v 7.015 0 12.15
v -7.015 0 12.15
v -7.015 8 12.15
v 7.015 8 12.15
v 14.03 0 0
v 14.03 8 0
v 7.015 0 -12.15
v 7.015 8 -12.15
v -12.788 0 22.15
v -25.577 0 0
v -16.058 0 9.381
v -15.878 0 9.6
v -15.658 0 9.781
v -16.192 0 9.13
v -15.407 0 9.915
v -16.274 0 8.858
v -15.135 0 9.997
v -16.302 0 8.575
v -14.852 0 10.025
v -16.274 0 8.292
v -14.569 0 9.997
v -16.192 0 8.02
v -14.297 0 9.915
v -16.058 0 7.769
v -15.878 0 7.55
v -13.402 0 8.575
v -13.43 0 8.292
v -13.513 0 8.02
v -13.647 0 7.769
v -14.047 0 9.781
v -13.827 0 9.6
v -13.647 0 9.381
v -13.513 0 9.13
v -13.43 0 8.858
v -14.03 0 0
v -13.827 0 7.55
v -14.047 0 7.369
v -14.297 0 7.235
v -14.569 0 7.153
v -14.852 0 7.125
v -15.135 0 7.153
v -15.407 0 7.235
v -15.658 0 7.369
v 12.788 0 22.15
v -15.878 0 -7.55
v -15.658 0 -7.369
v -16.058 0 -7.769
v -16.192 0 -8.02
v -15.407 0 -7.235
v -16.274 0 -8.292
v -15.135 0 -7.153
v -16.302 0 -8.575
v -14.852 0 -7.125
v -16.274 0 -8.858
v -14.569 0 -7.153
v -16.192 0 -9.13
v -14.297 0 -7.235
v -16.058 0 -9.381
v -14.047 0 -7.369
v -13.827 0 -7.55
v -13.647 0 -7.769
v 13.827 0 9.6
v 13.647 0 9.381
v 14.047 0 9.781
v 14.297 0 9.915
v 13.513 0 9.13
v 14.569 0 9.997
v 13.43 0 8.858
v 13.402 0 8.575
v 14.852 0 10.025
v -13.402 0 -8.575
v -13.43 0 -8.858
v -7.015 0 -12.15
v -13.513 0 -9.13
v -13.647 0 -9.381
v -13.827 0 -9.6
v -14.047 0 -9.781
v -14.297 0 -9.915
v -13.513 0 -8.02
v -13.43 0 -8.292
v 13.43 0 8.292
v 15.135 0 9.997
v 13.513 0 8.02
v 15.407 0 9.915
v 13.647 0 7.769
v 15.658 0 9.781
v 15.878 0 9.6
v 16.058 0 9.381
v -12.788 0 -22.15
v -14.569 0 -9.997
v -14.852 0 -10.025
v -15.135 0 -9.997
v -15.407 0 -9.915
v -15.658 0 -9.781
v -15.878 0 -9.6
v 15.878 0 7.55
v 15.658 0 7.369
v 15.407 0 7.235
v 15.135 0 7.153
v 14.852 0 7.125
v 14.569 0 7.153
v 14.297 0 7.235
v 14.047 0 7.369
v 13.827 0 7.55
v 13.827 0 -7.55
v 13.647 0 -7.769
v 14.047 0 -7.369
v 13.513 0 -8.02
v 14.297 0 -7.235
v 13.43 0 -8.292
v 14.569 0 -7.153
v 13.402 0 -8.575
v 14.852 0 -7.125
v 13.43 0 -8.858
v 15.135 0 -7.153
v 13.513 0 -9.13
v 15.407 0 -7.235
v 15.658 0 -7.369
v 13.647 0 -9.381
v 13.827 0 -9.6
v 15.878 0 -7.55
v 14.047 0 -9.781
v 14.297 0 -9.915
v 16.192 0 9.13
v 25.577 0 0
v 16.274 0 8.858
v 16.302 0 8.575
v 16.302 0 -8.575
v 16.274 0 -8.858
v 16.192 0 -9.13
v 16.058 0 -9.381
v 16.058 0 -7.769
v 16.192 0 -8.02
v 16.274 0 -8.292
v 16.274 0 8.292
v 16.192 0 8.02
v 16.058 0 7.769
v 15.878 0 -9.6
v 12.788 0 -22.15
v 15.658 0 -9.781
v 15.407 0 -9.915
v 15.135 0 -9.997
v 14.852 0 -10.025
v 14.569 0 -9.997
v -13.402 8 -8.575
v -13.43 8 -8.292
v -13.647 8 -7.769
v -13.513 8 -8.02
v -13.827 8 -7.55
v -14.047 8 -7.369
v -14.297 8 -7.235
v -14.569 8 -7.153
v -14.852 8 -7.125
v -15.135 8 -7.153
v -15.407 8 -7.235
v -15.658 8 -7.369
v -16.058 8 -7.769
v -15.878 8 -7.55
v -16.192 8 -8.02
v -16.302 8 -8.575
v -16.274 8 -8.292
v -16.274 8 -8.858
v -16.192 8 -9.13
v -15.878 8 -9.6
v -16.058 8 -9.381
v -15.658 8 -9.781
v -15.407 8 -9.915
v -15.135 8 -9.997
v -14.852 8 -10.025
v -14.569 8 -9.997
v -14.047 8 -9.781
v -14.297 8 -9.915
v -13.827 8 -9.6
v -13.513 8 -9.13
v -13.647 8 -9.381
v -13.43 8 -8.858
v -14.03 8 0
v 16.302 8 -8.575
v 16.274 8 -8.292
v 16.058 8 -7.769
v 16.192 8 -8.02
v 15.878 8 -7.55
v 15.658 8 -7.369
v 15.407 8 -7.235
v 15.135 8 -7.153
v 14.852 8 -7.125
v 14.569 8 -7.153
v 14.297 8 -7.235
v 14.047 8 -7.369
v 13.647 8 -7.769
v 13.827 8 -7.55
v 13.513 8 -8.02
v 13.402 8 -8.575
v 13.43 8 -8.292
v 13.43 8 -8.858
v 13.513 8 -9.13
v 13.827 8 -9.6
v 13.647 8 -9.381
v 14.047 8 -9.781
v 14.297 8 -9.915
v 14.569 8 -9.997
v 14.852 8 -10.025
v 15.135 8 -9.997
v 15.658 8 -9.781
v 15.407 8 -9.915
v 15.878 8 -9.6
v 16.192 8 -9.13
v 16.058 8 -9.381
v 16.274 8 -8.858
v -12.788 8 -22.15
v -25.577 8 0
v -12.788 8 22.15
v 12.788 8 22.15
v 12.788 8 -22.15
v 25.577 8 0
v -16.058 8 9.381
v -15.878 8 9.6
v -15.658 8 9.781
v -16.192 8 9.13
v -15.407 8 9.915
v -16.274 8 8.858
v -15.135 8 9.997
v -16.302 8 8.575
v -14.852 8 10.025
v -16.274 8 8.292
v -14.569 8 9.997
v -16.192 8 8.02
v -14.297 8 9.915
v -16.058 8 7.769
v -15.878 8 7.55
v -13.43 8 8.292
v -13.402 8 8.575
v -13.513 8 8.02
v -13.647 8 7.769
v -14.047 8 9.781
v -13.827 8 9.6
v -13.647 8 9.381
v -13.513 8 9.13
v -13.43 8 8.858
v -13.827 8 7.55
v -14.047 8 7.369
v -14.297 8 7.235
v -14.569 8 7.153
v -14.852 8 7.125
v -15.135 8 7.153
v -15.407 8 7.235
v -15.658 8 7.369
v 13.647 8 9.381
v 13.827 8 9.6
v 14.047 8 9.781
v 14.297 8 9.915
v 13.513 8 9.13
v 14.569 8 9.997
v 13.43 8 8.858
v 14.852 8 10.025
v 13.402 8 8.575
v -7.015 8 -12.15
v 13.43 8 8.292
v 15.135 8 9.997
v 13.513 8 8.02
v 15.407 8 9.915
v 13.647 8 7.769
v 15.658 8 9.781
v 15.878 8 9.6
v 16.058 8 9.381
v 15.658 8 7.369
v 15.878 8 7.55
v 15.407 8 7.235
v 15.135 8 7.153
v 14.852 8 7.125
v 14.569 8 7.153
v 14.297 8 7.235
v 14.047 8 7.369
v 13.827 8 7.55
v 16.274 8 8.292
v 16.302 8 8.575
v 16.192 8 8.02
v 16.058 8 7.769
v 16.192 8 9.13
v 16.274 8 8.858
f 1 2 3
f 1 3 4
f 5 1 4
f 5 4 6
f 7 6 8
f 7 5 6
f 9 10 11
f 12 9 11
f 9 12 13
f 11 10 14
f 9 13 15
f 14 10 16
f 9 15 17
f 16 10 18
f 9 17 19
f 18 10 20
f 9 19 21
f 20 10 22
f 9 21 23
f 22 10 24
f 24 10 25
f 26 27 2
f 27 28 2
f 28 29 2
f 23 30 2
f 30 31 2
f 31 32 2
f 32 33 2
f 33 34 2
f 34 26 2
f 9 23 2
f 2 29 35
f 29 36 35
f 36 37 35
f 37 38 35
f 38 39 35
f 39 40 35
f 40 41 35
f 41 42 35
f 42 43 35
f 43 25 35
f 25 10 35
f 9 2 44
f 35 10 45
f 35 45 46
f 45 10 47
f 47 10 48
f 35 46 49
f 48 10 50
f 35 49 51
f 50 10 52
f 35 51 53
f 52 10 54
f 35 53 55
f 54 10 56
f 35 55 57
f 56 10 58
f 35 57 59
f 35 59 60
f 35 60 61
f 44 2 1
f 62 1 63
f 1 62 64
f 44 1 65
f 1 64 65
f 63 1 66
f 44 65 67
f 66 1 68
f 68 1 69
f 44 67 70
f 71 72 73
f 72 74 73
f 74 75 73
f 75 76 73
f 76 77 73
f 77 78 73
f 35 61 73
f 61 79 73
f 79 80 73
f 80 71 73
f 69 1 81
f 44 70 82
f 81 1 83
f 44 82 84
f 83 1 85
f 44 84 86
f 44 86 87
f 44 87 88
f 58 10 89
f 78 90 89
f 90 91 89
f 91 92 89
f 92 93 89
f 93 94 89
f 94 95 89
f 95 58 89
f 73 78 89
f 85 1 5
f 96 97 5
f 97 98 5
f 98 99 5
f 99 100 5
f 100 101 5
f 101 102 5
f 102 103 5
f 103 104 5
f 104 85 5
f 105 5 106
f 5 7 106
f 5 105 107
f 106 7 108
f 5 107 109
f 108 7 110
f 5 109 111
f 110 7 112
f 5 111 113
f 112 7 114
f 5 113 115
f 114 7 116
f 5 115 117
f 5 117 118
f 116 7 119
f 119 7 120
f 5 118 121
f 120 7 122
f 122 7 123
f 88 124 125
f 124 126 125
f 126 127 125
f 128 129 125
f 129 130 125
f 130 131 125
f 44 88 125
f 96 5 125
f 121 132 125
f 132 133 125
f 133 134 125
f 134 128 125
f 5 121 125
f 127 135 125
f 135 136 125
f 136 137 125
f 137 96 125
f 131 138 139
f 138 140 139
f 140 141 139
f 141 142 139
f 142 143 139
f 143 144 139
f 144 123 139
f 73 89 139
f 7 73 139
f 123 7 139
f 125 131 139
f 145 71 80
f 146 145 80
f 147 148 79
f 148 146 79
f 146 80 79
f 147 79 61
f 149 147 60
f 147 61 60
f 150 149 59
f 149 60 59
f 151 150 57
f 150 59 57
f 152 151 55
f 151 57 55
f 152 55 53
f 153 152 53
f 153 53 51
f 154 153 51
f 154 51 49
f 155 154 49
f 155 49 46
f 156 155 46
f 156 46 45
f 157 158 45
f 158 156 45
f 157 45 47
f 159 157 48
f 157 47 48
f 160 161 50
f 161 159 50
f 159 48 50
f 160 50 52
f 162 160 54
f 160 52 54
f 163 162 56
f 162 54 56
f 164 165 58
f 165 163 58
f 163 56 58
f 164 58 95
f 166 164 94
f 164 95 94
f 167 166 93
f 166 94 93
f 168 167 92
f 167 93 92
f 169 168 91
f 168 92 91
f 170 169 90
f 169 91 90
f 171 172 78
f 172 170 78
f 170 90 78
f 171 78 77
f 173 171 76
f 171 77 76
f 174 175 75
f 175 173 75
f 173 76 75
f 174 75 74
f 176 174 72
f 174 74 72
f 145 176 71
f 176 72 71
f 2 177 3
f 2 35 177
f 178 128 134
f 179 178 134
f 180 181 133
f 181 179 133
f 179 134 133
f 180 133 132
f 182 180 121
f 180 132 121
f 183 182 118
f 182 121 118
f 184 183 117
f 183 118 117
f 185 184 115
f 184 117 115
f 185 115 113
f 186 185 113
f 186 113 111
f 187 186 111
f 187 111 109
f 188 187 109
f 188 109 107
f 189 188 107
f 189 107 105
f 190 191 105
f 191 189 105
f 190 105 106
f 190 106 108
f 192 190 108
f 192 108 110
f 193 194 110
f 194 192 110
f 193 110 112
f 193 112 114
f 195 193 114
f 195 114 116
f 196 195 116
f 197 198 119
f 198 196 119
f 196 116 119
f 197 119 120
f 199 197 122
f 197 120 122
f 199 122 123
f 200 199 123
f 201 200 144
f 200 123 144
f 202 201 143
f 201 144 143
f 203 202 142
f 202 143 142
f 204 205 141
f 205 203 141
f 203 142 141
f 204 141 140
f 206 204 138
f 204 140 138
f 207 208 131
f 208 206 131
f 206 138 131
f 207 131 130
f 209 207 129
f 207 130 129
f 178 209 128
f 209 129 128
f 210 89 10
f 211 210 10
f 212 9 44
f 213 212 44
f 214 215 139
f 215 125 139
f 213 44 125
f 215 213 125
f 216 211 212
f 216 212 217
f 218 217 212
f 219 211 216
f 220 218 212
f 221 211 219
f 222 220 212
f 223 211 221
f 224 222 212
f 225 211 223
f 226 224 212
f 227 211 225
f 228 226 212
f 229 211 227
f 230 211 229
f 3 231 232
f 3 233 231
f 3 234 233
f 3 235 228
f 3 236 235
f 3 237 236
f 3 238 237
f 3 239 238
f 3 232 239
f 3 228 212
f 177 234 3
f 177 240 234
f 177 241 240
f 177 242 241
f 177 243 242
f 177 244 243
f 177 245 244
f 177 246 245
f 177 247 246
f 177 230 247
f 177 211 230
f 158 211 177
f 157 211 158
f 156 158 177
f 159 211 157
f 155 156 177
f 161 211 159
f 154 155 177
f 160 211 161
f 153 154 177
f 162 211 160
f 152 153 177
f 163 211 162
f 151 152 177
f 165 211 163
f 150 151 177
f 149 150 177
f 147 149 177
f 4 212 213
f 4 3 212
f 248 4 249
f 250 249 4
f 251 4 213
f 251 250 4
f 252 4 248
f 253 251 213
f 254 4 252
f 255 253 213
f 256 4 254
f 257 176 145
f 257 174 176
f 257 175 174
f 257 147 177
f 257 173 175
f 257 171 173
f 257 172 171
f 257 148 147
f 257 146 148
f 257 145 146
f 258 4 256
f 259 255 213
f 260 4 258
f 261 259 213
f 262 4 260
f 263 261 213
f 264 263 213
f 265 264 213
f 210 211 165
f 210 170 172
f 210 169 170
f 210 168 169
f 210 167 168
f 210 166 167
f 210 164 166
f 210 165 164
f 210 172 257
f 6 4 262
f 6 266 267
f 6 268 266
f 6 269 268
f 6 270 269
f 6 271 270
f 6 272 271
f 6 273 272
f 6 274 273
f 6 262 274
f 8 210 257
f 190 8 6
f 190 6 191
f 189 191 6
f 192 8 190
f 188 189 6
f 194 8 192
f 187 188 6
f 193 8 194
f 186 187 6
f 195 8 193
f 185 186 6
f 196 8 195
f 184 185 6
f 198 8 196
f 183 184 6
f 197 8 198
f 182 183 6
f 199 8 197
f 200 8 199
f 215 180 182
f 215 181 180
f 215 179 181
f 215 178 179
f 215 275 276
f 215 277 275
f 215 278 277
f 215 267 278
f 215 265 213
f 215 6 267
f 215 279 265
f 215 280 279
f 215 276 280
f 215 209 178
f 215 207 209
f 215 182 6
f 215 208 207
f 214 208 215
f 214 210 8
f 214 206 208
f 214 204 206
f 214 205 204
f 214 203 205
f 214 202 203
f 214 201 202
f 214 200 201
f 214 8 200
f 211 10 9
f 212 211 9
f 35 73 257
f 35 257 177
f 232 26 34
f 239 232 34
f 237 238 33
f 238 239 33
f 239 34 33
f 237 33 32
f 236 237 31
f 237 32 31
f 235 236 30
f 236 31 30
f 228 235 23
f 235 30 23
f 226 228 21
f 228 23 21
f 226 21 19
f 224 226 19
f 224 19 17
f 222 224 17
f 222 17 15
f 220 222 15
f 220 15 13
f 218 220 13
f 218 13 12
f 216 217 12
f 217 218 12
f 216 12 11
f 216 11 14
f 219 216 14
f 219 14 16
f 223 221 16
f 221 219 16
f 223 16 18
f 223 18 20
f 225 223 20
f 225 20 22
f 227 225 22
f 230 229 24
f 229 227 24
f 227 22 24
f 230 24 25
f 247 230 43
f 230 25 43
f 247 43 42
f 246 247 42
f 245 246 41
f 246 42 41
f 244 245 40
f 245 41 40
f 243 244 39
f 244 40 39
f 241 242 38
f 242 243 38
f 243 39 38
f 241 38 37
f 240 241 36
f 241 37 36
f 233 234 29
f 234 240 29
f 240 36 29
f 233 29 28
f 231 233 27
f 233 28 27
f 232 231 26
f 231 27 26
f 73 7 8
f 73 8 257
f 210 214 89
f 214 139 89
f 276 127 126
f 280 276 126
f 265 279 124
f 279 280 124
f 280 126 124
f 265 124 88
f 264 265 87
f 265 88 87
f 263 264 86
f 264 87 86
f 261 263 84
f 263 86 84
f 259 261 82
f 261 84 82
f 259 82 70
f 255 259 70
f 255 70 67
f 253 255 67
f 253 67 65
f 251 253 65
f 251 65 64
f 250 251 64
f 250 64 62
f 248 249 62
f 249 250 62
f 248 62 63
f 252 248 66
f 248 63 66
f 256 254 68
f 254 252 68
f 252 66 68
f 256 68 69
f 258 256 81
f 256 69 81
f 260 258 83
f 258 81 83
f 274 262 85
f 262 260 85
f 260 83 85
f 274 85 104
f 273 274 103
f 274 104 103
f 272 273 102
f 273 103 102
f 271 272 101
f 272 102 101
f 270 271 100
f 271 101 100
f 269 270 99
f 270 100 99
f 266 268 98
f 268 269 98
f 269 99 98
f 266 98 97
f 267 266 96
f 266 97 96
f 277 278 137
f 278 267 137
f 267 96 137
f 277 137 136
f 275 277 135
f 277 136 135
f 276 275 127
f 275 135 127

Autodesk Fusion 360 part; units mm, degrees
sketch "Spacer" plane through (0, 0, 0) normal (0, 1, 0) x (1, 0, 0)
  line L0 (7.0148, 12.15) -> (-7.0148, 12.15)
  line L1 (-7.0148, 12.15) -> (-14.0296, 0)
  line L2 (-14.0296, 0) -> (-7.0148, -12.15)
  line L3 (-7.0148, -12.15) -> (7.0148, -12.15)
  line L4 (7.0148, -12.15) -> (14.0296, 0)
  line L5 (14.0296, 0) -> (7.0148, 12.15)
  line L6 (-12.7883, 22.15) -> (-25.5766, 0)
  line L7 (-25.5766, 0) -> (-12.7883, -22.15)
  line L8 (-12.7883, -22.15) -> (12.7883, -22.15)
  line L9 (12.7883, -22.15) -> (25.5766, 0)
  line L10 (25.5766, 0) -> (12.7883, 22.15)
  line L11 (12.7883, 22.15) -> (-12.7883, 22.15)
  line L12 (-19.1825, 11.075) -> (-10.5222, 6.075) construction
  line L13 (10.5222, 6.075) -> (19.1825, 11.075) construction
  line L14 (10.5222, -6.075) -> (19.1825, -11.075) construction
  line L15 (-10.5222, -6.075) -> (-19.1825, -11.075) construction
  circle A0 centre (-14.8523, 8.575) radius 1.45
  circle A1 centre (14.8523, 8.575) radius 1.45
  circle A2 centre (14.8523, -8.575) radius 1.45
  circle A3 centre (-14.8523, -8.575) radius 1.45
  dimension "d2" = 12.15
  dimension "d3" = 10
  dimension "d5" = 2.9
  dimension "d6" = 2.9
  dimension "d7" = 2.9
  dimension "d8" = 2.9
extrude "Extrude1" add sketch "Spacer" along normal blind 8
sketch "Lock nut hole" plane through (0, 0, 0) normal (0, 1, 0) x (1, 0, 0)
  line L0 (-11.6192, 8.575) -> (-13.2358, 11.375)
  line L1 (-13.2358, 11.375) -> (-16.4689, 11.375)
  line L2 (-16.4689, 11.375) -> (-18.0855, 8.575)
  line L3 (-18.0855, 8.575) -> (-16.4689, 5.775)
  line L4 (-16.4689, 5.775) -> (-13.2358, 5.775)
  line L5 (-13.2358, 5.775) -> (-11.6192, 8.575)
  line L6 (16.4689, 11.375) -> (13.2358, 11.375)
  line L7 (13.2358, 11.375) -> (11.6192, 8.575)
  line L8 (11.6192, 8.575) -> (13.2358, 5.775)
  line L9 (13.2358, 5.775) -> (16.4689, 5.775)
  line L10 (16.4689, 5.775) -> (18.0855, 8.575)
  line L11 (18.0855, 8.575) -> (16.4689, 11.375)
  line L12 (16.4689, -5.775) -> (13.2358, -5.775)
  line L13 (13.2358, -5.775) -> (11.6192, -8.575)
  line L14 (11.6192, -8.575) -> (13.2358, -11.375)
  line L15 (13.2358, -11.375) -> (16.4689, -11.375)
  line L16 (16.4689, -11.375) -> (18.0855, -8.575)
  line L17 (18.0855, -8.575) -> (16.4689, -5.775)
  line L18 (-11.6192, -8.575) -> (-13.2358, -5.775)
  line L19 (-13.2358, -5.775) -> (-16.4689, -5.775)
  line L20 (-16.4689, -5.775) -> (-18.0855, -8.575)
  line L21 (-18.0855, -8.575) -> (-16.4689, -11.375)
  line L22 (-16.4689, -11.375) -> (-13.2358, -11.375)
  line L23 (-13.2358, -11.375) -> (-11.6192, -8.575)
  line L24 (-19.1825, 11.075) -> (-10.5222, 6.075)
  line L25 (10.5222, 6.075) -> (19.1825, 11.075)
  line L26 (-10.5222, -6.075) -> (-19.1825, -11.075)
  line L27 (10.5222, -6.075) -> (19.1825, -11.075)
  point P0 (-14.8523, 8.575)
  point P1 (14.8523, 8.575)
  point P2 (14.8523, -8.575)
  point P3 (-14.8523, -8.575)
  dimension "d11" = 2.8
  dimension "d12" = 2.8
  dimension "d13" = 2.8
  dimension "d14" = 2.8
extrude "Extrude2" [suppressed]
move_body "Move1" [suppressed]
